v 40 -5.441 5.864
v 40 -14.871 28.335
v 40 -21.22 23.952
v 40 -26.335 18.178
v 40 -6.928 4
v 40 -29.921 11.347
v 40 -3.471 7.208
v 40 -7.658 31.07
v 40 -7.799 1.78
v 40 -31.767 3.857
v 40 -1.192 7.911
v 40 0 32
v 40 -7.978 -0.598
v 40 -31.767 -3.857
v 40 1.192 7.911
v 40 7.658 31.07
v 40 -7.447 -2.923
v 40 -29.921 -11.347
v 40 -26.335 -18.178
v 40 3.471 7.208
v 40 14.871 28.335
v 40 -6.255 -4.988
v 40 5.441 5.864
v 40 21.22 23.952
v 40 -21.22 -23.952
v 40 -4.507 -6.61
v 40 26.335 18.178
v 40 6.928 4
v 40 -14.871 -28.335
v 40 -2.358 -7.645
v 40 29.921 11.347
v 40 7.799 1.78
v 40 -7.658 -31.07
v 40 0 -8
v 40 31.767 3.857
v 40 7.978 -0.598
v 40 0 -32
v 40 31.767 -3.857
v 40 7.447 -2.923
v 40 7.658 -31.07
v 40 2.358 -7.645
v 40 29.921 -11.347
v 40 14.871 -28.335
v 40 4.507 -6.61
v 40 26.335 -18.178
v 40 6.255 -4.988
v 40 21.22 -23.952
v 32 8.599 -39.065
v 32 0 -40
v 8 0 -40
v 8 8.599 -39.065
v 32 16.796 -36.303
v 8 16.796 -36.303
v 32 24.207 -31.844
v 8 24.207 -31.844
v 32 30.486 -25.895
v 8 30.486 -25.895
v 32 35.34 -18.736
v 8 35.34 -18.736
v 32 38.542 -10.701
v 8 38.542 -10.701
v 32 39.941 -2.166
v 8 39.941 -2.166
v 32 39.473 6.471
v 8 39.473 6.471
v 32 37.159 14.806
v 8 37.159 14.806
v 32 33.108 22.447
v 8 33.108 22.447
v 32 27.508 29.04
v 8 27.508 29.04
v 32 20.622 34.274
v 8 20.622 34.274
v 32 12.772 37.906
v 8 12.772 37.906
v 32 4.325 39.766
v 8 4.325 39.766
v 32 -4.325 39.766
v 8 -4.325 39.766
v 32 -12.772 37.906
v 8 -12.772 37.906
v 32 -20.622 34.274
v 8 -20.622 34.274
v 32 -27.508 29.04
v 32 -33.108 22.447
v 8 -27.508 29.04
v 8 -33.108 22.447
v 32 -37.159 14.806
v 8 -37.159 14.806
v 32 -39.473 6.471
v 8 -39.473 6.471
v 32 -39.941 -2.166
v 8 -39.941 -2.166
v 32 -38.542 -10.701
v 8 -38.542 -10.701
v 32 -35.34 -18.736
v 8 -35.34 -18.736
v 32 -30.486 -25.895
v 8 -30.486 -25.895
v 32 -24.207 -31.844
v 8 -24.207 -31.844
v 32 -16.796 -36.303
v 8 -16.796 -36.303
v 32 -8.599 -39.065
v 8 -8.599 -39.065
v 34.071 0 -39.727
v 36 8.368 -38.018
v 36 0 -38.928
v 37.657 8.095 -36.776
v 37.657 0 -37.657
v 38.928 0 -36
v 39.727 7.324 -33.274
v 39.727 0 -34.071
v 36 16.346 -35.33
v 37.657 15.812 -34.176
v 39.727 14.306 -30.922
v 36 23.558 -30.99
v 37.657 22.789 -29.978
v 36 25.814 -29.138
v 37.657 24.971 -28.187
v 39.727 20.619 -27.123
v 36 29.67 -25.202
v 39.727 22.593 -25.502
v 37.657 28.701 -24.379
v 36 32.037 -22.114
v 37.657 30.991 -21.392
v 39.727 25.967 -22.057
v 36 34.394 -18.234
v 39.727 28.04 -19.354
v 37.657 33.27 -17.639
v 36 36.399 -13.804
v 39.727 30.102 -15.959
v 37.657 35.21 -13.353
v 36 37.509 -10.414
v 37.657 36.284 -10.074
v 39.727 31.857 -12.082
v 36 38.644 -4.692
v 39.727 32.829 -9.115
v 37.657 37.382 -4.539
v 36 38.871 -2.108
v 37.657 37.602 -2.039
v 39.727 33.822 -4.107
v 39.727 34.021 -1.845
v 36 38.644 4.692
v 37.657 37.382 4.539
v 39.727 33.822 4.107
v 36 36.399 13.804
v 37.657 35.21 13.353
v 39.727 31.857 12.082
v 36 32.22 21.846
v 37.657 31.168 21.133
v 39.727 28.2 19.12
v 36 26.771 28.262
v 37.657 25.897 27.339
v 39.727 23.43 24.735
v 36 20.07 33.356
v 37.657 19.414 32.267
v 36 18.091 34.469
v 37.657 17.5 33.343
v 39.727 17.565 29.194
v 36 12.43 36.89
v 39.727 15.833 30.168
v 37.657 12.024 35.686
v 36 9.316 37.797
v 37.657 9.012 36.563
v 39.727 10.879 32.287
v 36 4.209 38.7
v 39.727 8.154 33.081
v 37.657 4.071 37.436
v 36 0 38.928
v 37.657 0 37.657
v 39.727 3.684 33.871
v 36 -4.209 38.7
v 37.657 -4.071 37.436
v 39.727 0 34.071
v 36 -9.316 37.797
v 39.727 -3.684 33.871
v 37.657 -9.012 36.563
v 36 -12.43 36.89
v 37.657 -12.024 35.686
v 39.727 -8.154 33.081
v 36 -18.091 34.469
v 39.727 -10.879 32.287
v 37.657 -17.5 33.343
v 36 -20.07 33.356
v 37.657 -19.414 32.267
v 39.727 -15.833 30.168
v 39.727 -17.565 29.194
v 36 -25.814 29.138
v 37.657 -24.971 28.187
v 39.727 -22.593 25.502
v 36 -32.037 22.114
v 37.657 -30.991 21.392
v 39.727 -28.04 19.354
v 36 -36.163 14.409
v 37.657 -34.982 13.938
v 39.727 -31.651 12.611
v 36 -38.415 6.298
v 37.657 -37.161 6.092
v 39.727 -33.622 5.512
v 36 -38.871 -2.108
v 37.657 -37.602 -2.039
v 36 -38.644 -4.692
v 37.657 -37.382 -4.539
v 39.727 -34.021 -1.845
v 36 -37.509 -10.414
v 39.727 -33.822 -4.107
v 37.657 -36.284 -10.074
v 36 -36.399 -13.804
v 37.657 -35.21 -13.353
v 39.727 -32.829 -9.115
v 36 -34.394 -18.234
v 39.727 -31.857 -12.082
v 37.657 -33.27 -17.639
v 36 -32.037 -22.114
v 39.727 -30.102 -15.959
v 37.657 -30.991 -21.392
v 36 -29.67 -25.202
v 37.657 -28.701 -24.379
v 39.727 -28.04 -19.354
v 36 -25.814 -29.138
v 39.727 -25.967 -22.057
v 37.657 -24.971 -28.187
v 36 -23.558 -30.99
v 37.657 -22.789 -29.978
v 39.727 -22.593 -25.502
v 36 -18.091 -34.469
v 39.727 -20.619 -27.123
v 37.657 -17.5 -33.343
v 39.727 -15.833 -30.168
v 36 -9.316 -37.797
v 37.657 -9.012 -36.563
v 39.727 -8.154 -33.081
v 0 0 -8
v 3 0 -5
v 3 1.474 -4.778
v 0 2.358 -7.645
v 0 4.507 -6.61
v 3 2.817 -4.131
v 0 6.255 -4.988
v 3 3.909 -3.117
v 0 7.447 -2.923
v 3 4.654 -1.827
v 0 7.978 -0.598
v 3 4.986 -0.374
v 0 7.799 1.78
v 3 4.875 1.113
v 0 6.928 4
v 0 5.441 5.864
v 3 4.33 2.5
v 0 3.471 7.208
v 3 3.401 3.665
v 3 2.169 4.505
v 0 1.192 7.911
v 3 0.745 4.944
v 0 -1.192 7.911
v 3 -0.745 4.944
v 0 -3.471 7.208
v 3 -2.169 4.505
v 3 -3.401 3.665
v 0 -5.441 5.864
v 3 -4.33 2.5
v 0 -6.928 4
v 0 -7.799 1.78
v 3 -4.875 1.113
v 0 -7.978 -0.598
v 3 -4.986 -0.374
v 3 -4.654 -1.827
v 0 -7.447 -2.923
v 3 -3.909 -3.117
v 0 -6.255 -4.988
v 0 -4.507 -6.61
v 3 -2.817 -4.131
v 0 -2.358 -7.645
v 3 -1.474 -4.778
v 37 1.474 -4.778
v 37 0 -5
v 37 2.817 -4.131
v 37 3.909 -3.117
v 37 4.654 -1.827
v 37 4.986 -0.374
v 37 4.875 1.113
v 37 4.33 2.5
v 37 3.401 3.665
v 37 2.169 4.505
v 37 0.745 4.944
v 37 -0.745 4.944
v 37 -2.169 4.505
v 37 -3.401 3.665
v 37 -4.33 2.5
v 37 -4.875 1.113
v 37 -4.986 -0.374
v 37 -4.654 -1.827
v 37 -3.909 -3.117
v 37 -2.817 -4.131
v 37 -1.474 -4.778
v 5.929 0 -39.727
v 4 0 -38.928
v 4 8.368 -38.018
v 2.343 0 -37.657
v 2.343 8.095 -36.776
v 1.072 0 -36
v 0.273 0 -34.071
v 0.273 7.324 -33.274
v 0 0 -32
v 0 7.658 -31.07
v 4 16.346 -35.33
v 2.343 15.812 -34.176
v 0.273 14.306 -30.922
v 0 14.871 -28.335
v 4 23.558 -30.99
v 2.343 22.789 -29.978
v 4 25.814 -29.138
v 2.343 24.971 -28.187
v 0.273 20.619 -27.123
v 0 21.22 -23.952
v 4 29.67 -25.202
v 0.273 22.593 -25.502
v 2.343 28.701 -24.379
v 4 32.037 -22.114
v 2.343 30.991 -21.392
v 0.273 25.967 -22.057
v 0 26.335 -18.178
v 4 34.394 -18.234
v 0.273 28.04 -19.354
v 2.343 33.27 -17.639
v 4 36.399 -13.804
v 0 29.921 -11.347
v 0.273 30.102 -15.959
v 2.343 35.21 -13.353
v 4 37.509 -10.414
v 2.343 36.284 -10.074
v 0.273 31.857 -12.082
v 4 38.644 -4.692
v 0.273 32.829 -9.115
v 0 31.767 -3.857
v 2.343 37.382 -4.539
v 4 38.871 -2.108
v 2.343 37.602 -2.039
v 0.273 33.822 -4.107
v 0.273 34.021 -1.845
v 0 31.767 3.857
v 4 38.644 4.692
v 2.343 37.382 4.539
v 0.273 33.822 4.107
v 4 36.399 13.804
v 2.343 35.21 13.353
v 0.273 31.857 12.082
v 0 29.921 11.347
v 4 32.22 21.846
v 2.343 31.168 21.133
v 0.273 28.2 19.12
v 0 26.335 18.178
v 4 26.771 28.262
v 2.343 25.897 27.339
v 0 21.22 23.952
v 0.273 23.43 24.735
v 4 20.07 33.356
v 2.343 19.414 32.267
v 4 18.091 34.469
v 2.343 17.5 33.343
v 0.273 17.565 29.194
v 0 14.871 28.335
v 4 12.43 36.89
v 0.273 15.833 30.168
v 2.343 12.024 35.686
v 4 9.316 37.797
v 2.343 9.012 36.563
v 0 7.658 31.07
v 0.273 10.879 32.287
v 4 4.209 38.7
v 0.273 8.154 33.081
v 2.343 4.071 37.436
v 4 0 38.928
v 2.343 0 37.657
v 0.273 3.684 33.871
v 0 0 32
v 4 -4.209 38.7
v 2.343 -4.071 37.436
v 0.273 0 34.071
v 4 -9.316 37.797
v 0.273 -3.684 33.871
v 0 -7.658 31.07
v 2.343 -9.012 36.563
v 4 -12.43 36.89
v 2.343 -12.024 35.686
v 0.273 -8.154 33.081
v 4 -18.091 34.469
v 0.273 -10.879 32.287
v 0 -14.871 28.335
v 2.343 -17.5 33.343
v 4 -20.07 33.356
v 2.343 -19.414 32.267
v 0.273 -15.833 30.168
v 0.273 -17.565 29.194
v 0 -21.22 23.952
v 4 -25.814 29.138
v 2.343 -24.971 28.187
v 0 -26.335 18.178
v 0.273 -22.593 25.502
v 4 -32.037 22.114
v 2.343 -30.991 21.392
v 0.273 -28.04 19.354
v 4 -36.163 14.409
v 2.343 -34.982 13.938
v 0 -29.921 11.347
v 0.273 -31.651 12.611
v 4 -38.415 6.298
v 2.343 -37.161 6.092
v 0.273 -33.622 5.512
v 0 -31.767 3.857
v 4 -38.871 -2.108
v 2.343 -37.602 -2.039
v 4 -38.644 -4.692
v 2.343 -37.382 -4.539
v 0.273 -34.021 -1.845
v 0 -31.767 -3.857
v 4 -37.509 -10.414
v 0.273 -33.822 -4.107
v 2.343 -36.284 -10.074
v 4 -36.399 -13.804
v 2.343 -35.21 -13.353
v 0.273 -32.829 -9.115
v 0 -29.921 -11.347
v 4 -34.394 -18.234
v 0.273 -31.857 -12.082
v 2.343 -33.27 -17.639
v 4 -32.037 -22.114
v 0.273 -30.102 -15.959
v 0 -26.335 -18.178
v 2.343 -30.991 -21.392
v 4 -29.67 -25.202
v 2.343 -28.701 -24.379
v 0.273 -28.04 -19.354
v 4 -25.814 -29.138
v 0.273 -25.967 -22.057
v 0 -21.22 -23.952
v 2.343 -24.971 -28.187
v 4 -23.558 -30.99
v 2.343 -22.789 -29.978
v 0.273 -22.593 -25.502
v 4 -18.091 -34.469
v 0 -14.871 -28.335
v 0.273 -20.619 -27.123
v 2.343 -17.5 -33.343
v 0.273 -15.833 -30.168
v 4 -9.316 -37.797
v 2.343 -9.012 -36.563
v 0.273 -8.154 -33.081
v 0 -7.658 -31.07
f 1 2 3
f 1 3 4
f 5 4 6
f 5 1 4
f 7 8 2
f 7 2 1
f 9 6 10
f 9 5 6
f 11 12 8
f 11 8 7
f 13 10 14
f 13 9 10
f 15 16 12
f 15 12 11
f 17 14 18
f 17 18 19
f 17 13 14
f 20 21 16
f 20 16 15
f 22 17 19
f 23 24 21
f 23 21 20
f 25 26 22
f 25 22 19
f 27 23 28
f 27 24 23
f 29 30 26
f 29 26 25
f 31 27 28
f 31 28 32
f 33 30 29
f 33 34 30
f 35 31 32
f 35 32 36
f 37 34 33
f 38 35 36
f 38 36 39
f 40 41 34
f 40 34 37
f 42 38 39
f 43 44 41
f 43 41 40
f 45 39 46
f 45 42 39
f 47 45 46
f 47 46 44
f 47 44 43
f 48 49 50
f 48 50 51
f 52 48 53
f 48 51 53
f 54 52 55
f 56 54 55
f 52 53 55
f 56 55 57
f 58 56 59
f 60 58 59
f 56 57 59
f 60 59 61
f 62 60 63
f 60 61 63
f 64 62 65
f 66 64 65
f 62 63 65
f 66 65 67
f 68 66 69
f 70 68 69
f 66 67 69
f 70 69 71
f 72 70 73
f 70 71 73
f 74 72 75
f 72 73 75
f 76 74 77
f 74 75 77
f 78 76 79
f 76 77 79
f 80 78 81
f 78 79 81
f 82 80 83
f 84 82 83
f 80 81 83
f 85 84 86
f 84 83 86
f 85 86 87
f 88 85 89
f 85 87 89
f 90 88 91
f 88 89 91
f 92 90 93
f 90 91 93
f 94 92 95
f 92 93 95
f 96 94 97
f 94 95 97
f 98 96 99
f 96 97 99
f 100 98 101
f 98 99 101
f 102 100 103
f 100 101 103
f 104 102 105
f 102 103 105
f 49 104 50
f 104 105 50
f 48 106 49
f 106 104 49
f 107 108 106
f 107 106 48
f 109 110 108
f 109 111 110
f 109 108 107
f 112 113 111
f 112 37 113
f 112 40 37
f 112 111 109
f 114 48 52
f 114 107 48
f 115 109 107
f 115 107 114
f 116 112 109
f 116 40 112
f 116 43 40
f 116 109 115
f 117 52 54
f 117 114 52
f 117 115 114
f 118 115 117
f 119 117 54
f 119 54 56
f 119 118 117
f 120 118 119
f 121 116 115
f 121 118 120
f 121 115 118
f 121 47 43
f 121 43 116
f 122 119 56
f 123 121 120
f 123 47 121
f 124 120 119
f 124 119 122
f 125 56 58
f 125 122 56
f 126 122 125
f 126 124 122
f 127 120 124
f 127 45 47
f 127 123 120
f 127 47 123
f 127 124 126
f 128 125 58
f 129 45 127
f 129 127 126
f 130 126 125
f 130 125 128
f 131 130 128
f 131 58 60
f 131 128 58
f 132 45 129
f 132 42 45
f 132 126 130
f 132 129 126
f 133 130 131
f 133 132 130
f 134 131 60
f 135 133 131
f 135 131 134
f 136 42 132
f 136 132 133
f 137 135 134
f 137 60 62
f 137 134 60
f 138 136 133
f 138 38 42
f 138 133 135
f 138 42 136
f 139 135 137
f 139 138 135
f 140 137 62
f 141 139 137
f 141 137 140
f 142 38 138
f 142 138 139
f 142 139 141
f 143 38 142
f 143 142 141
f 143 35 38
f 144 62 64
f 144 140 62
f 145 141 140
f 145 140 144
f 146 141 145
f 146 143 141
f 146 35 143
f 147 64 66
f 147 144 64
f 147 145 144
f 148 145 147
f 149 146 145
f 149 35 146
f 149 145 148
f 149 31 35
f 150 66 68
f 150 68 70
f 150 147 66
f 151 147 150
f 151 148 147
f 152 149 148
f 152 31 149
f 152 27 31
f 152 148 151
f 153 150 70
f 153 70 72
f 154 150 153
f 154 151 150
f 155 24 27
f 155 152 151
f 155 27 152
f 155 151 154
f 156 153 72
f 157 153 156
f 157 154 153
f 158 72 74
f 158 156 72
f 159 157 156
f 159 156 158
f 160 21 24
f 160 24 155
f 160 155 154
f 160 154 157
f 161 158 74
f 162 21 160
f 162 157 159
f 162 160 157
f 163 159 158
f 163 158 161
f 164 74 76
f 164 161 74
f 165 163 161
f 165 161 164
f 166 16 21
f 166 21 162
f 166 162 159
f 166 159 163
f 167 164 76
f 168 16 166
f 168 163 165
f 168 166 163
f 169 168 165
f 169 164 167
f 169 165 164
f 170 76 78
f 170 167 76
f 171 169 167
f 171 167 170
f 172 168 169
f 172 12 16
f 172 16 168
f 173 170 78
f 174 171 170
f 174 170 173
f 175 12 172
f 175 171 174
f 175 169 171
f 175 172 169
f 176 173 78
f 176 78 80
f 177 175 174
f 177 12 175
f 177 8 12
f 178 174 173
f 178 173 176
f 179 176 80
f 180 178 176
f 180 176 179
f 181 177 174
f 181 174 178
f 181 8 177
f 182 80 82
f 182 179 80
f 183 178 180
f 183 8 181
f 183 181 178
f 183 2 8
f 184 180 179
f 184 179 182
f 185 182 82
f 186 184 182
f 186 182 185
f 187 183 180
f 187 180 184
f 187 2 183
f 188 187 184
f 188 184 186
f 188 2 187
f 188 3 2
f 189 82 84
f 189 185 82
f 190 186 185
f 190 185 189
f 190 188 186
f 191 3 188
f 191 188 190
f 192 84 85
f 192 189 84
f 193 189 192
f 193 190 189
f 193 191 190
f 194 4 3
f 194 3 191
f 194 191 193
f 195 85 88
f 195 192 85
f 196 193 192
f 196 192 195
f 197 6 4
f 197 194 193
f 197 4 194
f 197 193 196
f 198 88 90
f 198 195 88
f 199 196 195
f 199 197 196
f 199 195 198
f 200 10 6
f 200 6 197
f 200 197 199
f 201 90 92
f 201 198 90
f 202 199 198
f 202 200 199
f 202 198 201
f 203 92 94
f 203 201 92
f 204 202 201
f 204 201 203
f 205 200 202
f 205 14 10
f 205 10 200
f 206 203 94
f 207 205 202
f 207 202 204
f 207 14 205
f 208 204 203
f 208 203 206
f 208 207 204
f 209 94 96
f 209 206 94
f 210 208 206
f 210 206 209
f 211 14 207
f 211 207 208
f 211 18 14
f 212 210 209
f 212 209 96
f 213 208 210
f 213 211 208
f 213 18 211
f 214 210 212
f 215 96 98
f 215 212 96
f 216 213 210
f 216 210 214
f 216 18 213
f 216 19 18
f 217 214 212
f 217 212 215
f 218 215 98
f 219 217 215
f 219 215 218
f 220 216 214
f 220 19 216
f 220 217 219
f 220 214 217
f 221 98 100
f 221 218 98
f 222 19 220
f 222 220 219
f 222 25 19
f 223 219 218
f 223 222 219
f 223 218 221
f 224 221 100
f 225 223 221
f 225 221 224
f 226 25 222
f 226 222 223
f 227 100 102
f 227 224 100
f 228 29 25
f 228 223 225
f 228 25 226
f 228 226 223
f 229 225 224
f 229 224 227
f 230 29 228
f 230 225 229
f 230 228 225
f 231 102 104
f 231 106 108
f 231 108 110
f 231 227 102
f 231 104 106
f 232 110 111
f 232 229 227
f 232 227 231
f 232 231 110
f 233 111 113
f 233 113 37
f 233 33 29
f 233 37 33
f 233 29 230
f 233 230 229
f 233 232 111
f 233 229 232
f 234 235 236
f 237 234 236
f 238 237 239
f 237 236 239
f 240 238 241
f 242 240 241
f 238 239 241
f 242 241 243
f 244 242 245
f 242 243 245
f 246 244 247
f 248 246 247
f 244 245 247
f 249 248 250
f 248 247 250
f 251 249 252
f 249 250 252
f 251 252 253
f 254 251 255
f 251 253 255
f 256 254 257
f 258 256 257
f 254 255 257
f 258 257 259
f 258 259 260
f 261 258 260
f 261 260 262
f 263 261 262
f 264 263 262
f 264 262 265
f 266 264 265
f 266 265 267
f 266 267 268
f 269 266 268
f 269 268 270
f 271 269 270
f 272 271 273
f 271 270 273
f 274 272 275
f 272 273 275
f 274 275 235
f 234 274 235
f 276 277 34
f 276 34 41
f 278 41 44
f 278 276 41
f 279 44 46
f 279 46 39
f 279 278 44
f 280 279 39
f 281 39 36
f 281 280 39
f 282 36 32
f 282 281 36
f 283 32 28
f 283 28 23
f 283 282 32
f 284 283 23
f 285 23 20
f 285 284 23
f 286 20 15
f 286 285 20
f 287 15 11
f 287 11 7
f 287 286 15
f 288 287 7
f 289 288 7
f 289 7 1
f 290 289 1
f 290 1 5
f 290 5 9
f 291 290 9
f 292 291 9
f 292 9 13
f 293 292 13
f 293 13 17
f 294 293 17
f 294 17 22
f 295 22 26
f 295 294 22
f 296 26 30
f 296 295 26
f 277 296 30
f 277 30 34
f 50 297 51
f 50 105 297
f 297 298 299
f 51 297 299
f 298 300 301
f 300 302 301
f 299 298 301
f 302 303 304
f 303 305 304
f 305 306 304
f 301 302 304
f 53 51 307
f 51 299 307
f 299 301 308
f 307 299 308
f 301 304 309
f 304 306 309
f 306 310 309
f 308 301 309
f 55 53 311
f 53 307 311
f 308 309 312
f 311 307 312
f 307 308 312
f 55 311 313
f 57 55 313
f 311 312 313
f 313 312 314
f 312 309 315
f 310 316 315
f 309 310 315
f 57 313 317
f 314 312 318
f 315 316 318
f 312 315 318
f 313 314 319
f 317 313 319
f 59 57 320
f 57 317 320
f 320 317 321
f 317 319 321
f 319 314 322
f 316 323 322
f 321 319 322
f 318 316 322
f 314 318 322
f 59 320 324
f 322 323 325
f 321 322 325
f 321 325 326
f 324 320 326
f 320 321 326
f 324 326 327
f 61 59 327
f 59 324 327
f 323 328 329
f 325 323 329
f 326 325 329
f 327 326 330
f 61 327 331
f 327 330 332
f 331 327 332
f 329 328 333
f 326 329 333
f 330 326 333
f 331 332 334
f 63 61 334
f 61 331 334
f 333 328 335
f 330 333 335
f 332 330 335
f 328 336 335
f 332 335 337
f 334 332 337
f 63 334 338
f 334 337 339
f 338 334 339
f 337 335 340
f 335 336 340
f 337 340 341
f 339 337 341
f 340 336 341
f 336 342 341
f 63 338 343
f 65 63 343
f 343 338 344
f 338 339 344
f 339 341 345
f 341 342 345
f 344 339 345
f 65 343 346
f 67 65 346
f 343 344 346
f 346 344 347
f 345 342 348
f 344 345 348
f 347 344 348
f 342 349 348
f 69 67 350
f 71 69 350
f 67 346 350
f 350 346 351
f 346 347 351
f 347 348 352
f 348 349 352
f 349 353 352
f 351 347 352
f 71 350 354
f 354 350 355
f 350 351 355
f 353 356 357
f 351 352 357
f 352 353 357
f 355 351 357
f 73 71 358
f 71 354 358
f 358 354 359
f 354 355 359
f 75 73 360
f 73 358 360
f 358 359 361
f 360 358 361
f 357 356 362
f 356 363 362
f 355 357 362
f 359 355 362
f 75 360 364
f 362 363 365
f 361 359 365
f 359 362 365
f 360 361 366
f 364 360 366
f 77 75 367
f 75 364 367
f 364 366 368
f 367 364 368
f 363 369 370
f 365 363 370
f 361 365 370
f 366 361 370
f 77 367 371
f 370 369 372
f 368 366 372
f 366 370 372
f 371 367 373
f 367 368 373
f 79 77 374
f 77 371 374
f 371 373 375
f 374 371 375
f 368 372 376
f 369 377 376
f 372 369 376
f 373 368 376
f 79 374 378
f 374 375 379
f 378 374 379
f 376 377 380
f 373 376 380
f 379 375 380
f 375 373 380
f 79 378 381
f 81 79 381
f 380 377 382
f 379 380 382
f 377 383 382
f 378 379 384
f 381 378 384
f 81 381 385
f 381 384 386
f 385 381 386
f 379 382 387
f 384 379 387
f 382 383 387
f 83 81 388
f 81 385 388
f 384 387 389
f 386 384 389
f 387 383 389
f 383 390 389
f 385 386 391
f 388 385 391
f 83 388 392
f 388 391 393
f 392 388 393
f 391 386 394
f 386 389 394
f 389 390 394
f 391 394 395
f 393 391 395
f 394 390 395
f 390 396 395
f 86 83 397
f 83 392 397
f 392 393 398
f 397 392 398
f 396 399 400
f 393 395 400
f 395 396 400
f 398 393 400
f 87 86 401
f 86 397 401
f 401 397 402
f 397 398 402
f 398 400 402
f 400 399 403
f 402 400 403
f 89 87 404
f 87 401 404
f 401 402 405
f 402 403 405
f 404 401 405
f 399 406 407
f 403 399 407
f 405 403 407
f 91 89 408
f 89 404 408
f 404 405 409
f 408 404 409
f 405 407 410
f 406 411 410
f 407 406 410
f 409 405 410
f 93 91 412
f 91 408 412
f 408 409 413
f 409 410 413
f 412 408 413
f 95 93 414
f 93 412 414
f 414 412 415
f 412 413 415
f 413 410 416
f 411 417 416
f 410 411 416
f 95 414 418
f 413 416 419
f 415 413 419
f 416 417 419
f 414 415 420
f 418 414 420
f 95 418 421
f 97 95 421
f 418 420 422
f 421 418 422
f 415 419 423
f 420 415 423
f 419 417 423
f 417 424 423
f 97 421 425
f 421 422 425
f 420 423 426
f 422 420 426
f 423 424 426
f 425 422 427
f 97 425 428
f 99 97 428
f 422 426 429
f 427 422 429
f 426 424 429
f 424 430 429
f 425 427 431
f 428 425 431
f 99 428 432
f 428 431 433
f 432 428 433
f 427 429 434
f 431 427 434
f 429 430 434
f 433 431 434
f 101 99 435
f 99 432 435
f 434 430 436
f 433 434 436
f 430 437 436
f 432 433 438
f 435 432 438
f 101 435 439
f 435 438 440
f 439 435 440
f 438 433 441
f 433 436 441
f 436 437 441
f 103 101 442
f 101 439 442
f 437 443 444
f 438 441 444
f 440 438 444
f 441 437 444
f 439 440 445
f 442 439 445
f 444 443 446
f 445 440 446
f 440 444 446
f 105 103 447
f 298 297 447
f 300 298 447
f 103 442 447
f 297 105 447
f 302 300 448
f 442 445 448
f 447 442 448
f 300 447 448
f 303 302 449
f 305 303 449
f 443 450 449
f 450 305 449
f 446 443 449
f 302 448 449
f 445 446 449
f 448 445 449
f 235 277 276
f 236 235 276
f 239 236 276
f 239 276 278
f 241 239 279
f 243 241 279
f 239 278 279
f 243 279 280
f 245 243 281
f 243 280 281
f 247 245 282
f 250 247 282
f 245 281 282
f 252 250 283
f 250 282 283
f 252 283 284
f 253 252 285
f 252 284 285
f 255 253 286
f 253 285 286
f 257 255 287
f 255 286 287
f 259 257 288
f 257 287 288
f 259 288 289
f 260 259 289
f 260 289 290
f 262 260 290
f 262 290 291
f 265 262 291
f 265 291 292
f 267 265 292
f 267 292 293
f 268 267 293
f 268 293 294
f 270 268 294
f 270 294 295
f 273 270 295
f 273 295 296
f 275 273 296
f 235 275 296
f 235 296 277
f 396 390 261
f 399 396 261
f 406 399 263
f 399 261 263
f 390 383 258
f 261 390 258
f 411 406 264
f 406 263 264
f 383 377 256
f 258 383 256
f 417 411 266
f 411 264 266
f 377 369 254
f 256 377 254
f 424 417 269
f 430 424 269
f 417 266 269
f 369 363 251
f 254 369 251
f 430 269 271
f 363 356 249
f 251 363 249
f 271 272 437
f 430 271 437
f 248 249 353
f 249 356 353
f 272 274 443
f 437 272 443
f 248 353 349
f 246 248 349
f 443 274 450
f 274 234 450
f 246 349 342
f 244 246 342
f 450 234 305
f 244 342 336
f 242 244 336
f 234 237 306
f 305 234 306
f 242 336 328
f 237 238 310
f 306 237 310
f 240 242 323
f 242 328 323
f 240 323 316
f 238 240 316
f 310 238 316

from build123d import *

# Parameters (mm, degrees)
SKETCH1_R           = 40
BOSS_EXTRUDE1_DEPTH = 40
FILLET1_R           = 8
SKETCH2_R           = 5
CUT_EXTRUDE1_DEPTH  = 70.28203236
CHAMFER1_SIZE       = 3


with BuildPart() as part:
    # Sketch1 → Boss-Extrude1 (new body)
    with BuildSketch(Plane(origin=(0, 0, 0), x_dir=(0, 0, -1), z_dir=(1, 0, 0))):
        Circle(SKETCH1_R)
    extrude(amount=BOSS_EXTRUDE1_DEPTH)

    # Fillet1
    fillet1_edges = [part.edges().sort_by_distance(p)[0] for p in [
        (0, 0, 40),
        (40, 0, 40),
    ]]
    fillet(fillet1_edges, radius=FILLET1_R)

    # Sketch2 → Cut-Extrude1 (cut, through all)
    with BuildSketch(Plane(origin=(40, 0, 0), x_dir=(0, 0, -1), z_dir=(1, 0, 0))):
        Circle(SKETCH2_R)
    extrude(amount=-CUT_EXTRUDE1_DEPTH, mode=Mode.SUBTRACT)

    # Chamfer1
    chamfer1_edges = [part.edges().sort_by_distance(p)[0] for p in [
        (0, 0, 5),
        (40, 0, 5),
    ]]
    chamfer(chamfer1_edges, length=CHAMFER1_SIZE)


solid = part.part
